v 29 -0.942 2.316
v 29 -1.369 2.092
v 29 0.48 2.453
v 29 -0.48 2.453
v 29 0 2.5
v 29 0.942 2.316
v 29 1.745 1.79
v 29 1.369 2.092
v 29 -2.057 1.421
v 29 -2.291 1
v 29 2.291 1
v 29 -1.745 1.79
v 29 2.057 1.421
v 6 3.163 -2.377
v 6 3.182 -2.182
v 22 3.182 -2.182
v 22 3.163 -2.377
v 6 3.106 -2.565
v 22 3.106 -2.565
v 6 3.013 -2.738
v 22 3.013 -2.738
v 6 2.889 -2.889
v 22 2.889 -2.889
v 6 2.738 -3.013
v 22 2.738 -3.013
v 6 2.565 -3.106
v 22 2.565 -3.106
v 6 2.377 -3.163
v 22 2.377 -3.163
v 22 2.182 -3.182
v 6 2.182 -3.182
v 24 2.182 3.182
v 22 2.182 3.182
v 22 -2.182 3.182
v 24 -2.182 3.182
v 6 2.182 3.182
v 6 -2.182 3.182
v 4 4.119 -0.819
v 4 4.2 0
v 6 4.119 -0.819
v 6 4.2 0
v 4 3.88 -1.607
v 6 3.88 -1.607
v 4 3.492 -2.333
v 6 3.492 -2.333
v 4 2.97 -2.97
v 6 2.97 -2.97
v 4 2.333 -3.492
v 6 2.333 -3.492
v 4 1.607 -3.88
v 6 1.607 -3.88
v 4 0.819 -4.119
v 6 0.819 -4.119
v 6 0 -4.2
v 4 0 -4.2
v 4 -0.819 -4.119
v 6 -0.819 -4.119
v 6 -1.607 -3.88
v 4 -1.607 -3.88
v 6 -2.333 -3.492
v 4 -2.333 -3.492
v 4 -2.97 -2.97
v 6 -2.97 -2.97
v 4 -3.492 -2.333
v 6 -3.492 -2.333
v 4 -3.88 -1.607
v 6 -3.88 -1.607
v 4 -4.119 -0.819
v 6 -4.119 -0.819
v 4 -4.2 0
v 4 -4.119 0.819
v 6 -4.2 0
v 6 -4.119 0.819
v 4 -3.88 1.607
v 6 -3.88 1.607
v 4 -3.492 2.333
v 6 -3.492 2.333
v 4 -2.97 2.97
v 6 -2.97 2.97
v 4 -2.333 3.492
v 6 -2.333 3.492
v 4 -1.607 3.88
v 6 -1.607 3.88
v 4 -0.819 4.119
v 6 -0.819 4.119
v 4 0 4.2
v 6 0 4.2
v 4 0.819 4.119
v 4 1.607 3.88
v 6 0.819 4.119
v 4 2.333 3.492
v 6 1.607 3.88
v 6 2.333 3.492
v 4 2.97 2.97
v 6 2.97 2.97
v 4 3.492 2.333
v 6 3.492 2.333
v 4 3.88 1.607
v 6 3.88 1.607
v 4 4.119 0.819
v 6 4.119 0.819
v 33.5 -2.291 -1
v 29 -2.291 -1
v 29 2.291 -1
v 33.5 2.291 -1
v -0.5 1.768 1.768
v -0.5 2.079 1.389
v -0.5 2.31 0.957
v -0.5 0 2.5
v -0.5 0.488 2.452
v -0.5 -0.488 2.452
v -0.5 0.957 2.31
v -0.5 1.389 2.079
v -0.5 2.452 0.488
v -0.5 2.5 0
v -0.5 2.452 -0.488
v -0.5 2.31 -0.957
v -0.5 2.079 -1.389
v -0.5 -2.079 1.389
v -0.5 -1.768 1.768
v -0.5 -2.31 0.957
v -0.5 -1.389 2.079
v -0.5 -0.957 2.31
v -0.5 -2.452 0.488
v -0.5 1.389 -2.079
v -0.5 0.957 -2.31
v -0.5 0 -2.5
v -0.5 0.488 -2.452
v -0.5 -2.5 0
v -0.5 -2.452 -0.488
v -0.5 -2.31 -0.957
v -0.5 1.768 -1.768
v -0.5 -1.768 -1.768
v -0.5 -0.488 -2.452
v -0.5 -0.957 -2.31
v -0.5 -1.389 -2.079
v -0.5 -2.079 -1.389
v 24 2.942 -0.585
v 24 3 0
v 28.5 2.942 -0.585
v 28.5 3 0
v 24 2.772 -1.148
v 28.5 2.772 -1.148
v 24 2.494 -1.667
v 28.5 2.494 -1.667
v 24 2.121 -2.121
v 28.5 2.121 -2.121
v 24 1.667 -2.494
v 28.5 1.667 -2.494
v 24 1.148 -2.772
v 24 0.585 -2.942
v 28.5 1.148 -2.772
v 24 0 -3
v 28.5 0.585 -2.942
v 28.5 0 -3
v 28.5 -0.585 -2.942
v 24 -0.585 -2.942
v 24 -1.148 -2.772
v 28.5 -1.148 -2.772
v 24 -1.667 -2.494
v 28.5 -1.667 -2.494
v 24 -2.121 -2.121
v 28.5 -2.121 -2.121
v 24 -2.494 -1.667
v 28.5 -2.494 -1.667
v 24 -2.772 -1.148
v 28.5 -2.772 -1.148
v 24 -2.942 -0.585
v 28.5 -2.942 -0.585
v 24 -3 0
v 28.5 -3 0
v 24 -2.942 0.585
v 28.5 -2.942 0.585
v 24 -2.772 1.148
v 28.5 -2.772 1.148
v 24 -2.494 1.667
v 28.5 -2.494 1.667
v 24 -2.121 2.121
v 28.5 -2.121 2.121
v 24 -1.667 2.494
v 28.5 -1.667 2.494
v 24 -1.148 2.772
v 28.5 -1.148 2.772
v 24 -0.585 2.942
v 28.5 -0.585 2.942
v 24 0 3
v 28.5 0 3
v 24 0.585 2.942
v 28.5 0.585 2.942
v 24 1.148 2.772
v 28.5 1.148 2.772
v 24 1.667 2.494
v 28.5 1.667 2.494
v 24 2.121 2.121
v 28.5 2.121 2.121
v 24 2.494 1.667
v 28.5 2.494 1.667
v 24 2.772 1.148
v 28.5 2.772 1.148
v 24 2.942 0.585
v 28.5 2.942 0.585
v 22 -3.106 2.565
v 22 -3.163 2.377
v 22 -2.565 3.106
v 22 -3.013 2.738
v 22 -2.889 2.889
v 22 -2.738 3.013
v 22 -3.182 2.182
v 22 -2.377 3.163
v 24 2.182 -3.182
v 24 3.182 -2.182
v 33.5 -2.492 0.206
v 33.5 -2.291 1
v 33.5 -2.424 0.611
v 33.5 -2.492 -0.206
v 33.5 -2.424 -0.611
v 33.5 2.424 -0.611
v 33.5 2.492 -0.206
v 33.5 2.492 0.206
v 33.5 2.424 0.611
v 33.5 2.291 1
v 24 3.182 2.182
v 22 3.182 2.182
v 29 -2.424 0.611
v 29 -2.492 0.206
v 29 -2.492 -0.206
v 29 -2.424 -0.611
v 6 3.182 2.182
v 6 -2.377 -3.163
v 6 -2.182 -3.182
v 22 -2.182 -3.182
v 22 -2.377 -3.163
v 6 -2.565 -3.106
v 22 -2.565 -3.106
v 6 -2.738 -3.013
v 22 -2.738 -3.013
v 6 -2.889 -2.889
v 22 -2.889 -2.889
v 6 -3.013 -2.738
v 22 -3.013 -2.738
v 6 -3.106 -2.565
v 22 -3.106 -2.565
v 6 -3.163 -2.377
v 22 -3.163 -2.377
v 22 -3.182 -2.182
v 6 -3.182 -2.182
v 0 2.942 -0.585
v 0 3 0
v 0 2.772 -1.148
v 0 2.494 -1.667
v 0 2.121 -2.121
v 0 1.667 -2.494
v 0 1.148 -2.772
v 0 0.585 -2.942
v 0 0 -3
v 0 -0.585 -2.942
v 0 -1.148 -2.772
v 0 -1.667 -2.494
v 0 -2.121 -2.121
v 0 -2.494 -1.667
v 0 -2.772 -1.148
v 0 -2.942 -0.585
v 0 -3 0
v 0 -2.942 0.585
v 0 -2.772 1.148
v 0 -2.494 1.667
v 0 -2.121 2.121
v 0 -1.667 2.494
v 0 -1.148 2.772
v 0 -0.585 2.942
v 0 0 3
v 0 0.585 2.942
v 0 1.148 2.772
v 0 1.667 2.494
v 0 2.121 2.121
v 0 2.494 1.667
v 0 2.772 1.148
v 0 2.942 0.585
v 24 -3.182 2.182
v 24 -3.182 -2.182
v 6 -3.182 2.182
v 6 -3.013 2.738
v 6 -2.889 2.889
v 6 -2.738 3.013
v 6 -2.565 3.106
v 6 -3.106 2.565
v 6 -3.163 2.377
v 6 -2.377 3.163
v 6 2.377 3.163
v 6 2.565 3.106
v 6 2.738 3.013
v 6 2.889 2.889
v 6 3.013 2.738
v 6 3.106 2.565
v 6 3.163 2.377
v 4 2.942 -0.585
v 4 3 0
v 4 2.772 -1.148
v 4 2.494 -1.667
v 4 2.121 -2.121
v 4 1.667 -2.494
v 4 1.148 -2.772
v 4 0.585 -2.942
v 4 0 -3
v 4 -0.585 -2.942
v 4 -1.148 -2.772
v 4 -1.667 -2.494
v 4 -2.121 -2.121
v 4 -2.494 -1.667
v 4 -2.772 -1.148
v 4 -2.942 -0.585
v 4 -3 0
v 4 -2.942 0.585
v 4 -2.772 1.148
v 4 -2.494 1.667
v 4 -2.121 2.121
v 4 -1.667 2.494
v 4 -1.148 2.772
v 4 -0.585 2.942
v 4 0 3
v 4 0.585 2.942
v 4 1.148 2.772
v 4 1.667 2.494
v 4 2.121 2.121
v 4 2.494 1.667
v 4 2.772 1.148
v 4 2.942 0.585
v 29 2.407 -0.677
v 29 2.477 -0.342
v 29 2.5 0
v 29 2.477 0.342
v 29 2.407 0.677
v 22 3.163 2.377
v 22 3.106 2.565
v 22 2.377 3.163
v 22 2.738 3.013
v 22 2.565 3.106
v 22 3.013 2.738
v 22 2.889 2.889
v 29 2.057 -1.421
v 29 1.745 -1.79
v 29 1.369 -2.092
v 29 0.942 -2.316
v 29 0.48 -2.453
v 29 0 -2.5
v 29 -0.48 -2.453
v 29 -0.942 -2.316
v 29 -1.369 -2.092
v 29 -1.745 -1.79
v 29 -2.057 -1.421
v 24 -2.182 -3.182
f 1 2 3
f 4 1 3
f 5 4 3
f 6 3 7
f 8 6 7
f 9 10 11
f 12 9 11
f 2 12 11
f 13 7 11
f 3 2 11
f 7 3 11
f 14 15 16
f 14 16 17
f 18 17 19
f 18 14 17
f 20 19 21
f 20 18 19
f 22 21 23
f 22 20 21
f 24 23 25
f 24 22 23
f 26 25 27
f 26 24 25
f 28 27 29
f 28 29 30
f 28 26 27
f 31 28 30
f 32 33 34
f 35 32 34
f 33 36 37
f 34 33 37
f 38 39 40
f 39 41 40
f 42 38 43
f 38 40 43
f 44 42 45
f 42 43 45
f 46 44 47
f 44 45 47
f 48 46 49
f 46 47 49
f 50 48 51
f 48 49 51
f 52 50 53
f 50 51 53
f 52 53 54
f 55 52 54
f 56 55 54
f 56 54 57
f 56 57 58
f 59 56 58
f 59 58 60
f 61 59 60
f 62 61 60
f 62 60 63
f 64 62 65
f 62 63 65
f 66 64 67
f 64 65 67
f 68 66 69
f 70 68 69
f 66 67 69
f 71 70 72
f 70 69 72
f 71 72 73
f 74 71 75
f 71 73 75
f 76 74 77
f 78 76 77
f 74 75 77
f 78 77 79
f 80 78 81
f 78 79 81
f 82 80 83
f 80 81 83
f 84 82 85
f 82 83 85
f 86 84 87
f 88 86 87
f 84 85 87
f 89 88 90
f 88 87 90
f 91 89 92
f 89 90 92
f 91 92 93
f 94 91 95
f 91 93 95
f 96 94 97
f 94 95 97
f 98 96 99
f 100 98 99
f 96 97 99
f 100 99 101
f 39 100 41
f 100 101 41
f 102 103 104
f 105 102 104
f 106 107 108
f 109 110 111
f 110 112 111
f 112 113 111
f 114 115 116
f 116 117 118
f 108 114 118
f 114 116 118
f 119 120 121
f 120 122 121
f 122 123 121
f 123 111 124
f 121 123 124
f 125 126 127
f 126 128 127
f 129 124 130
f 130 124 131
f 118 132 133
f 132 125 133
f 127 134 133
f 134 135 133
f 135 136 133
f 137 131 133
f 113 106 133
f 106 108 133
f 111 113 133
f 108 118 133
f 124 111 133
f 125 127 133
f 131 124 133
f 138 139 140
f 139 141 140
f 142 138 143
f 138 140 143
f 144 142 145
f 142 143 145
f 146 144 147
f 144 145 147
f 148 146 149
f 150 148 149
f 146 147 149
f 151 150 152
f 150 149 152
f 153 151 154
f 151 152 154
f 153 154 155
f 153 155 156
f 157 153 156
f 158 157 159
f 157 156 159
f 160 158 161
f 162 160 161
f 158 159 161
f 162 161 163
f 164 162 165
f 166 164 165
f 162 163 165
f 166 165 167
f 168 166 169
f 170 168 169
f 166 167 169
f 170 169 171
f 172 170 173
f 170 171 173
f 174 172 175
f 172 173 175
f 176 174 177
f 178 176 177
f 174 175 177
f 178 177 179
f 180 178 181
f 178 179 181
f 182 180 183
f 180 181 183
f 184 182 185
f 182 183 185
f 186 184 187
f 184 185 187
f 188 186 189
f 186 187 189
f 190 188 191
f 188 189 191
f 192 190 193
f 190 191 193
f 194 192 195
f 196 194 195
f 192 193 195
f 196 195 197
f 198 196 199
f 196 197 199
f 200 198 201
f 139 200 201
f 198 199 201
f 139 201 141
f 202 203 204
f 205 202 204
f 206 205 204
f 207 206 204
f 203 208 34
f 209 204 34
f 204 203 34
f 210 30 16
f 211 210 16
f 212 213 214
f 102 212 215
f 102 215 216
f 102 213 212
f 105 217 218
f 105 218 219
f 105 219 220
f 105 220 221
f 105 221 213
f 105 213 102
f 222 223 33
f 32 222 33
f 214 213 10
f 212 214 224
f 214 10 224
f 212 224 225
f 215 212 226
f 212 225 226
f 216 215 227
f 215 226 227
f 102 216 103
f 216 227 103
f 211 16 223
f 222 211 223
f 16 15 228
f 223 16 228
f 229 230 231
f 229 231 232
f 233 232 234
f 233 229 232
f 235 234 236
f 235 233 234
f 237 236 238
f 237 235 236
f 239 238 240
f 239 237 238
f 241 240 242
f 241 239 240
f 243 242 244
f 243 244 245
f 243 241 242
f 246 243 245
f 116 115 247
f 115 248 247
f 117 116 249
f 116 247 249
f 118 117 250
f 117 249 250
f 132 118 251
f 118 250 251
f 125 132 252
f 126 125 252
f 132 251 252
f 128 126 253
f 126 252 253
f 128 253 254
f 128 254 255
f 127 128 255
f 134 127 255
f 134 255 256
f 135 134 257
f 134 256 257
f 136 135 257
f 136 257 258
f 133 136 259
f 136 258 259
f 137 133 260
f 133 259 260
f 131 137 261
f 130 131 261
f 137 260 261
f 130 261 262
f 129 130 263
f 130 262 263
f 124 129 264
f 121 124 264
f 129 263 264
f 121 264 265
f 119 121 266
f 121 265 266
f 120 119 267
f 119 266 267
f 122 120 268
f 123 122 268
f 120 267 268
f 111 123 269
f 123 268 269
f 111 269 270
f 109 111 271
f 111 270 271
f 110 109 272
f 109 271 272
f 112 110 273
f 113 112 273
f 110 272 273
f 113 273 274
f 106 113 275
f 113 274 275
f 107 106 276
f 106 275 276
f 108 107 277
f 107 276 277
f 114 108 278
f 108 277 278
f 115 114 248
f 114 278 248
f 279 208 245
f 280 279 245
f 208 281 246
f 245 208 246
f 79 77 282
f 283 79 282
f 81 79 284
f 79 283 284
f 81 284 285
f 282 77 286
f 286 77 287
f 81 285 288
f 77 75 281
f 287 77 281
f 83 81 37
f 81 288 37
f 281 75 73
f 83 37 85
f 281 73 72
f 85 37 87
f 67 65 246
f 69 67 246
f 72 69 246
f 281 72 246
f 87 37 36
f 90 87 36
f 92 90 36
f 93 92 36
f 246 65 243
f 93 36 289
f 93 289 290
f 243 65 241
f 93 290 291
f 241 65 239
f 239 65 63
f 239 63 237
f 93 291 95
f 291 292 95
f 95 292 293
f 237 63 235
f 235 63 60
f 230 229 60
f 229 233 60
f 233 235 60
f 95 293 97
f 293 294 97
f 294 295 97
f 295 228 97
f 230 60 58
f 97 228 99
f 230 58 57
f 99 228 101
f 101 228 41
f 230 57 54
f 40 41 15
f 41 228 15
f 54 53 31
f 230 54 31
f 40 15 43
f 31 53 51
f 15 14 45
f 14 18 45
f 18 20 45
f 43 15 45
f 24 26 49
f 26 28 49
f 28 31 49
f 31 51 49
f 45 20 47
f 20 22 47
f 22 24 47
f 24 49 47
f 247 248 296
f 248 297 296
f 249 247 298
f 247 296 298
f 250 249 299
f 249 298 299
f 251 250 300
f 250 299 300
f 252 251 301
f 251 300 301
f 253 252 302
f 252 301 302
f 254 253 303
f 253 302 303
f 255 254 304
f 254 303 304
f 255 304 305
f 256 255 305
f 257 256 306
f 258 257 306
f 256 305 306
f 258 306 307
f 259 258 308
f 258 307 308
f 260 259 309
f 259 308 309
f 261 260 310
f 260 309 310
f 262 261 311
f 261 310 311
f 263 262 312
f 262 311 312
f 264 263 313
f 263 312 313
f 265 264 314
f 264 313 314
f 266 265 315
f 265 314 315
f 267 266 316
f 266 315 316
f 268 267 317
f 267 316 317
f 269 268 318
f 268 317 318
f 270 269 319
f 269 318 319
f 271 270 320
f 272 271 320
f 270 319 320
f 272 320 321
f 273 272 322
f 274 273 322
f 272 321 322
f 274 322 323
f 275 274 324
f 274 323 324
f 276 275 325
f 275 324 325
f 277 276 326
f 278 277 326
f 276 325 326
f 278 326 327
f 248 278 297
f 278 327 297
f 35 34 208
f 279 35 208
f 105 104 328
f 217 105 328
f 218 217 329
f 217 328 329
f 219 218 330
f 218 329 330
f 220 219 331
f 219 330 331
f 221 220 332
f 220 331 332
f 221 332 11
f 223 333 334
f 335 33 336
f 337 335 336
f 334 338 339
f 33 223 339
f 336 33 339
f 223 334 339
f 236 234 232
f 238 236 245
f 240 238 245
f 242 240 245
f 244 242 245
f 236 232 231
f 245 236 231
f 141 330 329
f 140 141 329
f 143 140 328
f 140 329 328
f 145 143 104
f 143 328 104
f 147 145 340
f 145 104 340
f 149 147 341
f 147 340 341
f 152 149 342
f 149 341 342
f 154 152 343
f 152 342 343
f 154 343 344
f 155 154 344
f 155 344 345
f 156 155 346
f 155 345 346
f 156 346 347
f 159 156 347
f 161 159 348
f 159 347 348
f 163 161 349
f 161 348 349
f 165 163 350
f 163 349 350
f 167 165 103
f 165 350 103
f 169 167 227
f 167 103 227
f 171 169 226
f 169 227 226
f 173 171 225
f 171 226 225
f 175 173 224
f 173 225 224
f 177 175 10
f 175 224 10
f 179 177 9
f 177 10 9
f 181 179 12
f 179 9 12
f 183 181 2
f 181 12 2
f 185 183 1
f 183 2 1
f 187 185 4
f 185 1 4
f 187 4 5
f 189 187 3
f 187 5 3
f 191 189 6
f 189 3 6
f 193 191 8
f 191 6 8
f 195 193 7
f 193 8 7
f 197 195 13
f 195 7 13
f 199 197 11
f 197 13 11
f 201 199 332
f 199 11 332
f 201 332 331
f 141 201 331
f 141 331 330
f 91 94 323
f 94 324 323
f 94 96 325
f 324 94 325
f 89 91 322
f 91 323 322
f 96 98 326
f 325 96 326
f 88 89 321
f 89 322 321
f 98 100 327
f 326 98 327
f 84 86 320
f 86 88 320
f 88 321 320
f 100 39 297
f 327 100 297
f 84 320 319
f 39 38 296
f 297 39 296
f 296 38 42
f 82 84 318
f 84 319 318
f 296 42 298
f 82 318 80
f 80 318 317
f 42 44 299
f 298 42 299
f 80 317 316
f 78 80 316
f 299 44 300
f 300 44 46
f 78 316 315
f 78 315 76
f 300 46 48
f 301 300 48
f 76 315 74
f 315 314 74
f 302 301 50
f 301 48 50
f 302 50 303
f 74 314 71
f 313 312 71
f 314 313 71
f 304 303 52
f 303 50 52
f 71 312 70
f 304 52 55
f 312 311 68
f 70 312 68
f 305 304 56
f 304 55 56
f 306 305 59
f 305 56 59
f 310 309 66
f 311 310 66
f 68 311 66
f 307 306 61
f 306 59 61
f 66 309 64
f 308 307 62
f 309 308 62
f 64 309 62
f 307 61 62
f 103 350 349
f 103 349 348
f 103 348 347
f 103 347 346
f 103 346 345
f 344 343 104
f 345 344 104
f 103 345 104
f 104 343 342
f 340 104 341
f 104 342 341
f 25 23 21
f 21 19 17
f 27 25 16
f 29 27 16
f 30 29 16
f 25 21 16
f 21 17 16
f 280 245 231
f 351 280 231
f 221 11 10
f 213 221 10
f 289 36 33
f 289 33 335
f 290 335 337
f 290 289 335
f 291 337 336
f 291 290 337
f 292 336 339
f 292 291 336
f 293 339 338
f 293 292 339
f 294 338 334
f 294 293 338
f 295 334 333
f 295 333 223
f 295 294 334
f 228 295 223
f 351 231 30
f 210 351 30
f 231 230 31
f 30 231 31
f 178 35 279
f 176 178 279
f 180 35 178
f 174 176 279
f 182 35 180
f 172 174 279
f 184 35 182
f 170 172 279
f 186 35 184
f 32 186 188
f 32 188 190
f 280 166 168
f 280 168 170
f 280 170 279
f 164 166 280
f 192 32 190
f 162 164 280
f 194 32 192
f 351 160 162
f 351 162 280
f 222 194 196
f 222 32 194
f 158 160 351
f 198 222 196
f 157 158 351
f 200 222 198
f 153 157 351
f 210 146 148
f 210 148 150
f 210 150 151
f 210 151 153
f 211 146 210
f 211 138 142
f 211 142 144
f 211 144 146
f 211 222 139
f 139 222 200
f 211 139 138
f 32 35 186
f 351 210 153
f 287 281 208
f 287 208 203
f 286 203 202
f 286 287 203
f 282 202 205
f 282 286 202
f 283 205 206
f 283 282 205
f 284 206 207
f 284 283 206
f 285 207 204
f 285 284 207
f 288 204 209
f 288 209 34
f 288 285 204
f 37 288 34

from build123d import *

# Parameters (mm, degrees)
EXTRUDE_1_DEPTH = 16
EXTRUDE_2_DEPTH = 2
EXTRUDE_3_DEPTH = 5


with BuildPart() as part:
    # 草图1 → 旋转1 (revolve)
    with BuildSketch(Plane.XY):
        Polygon((0, 3), (4, 3), (4, 4.2), (6, 4.2), (6, 0), (0, 0), (-0.5, 0), (-0.5, 2.5), align=None)
    revolve(axis=Axis((6, 0, 0), (-1, 0, 0)))

    # 草图2 → 凸台-拉伸1 (add)
    with BuildSketch(Plane(origin=(6, 0, 0), x_dir=(0, 0, -1), z_dir=(1, 0, 0))):
        with BuildLine():
            Line((-2.181980515, 3.181980515), (2.181980515, 3.181980515))
            ThreePointArc((2.181980515, 3.181980515), (2.889087297, 2.889087297), (3.181980515, 2.181980515))
            Line((3.181980515, 2.181980515), (3.181980515, -2.181980515))
            ThreePointArc((3.181980515, -2.181980515), (2.889087297, -2.889087297), (2.181980515, -3.181980515))
            Line((2.181980515, -3.181980515), (-2.181980515, -3.181980515))
            ThreePointArc((-2.181980515, -3.181980515), (-2.889087297, -2.889087297), (-3.181980515, -2.181980515))
            Line((-3.181980515, -2.181980515), (-3.181980515, 2.181980515))
            ThreePointArc((-3.181980515, 2.181980515), (-2.889087297, 2.889087297), (-2.181980515, 3.181980515))
        make_face()
    extrude(amount=EXTRUDE_1_DEPTH)

    # 草图3 → 凸台-拉伸2 (add)
    with BuildSketch(Plane(origin=(22, 0, 0), x_dir=(0, 0, -1), z_dir=(1, 0, 0))):
        Polygon((3.181980515, 2.181980515), (2.181980515, 3.181980515), (-2.181980515, 3.181980515), (-3.181980515, 2.181980515), (-3.181980515, -2.181980515), (-2.181980515, -3.181980515), (2.181980515, -3.181980515), (3.181980515, -2.181980515), align=None)
    extrude(amount=EXTRUDE_2_DEPTH)

    # 草图4 → 旋转2 (revolve)
    with BuildSketch(Plane.XY):
        Polygon((28.5, 3), (29, 2.5), (29, 0), (24, 0), (24, 3), align=None)
    revolve(axis=Axis((29, 0, 0), (-1, 0, 0)))

    # 草图5 → 凸台-拉伸3 (add)
    with BuildSketch(Plane(origin=(28.5, 0, 0), x_dir=(0, 0, -1), z_dir=(1, 0, 0))):
        with BuildLine():
            Line((-1, -1.791287847), (-1, -2.291287847))
            ThreePointArc((-1, -2.291287847), (0, -2.5), (1, -2.291287847))
            Line((1, -2.291287847), (1, -1.791287847))
            Line((1, -1.791287847), (1, 1.791287847))
            Line((1, 1.791287847), (1, 2.291287847))
            ThreePointArc((1, 2.291287847), (0, 2.5), (-1, 2.291287847))
            Line((-1, 2.291287847), (-1, 1.791287847))
            Line((-1, 1.791287847), (-1, -1.791287847))
        make_face()
    extrude(amount=EXTRUDE_3_DEPTH)


solid = part.part
